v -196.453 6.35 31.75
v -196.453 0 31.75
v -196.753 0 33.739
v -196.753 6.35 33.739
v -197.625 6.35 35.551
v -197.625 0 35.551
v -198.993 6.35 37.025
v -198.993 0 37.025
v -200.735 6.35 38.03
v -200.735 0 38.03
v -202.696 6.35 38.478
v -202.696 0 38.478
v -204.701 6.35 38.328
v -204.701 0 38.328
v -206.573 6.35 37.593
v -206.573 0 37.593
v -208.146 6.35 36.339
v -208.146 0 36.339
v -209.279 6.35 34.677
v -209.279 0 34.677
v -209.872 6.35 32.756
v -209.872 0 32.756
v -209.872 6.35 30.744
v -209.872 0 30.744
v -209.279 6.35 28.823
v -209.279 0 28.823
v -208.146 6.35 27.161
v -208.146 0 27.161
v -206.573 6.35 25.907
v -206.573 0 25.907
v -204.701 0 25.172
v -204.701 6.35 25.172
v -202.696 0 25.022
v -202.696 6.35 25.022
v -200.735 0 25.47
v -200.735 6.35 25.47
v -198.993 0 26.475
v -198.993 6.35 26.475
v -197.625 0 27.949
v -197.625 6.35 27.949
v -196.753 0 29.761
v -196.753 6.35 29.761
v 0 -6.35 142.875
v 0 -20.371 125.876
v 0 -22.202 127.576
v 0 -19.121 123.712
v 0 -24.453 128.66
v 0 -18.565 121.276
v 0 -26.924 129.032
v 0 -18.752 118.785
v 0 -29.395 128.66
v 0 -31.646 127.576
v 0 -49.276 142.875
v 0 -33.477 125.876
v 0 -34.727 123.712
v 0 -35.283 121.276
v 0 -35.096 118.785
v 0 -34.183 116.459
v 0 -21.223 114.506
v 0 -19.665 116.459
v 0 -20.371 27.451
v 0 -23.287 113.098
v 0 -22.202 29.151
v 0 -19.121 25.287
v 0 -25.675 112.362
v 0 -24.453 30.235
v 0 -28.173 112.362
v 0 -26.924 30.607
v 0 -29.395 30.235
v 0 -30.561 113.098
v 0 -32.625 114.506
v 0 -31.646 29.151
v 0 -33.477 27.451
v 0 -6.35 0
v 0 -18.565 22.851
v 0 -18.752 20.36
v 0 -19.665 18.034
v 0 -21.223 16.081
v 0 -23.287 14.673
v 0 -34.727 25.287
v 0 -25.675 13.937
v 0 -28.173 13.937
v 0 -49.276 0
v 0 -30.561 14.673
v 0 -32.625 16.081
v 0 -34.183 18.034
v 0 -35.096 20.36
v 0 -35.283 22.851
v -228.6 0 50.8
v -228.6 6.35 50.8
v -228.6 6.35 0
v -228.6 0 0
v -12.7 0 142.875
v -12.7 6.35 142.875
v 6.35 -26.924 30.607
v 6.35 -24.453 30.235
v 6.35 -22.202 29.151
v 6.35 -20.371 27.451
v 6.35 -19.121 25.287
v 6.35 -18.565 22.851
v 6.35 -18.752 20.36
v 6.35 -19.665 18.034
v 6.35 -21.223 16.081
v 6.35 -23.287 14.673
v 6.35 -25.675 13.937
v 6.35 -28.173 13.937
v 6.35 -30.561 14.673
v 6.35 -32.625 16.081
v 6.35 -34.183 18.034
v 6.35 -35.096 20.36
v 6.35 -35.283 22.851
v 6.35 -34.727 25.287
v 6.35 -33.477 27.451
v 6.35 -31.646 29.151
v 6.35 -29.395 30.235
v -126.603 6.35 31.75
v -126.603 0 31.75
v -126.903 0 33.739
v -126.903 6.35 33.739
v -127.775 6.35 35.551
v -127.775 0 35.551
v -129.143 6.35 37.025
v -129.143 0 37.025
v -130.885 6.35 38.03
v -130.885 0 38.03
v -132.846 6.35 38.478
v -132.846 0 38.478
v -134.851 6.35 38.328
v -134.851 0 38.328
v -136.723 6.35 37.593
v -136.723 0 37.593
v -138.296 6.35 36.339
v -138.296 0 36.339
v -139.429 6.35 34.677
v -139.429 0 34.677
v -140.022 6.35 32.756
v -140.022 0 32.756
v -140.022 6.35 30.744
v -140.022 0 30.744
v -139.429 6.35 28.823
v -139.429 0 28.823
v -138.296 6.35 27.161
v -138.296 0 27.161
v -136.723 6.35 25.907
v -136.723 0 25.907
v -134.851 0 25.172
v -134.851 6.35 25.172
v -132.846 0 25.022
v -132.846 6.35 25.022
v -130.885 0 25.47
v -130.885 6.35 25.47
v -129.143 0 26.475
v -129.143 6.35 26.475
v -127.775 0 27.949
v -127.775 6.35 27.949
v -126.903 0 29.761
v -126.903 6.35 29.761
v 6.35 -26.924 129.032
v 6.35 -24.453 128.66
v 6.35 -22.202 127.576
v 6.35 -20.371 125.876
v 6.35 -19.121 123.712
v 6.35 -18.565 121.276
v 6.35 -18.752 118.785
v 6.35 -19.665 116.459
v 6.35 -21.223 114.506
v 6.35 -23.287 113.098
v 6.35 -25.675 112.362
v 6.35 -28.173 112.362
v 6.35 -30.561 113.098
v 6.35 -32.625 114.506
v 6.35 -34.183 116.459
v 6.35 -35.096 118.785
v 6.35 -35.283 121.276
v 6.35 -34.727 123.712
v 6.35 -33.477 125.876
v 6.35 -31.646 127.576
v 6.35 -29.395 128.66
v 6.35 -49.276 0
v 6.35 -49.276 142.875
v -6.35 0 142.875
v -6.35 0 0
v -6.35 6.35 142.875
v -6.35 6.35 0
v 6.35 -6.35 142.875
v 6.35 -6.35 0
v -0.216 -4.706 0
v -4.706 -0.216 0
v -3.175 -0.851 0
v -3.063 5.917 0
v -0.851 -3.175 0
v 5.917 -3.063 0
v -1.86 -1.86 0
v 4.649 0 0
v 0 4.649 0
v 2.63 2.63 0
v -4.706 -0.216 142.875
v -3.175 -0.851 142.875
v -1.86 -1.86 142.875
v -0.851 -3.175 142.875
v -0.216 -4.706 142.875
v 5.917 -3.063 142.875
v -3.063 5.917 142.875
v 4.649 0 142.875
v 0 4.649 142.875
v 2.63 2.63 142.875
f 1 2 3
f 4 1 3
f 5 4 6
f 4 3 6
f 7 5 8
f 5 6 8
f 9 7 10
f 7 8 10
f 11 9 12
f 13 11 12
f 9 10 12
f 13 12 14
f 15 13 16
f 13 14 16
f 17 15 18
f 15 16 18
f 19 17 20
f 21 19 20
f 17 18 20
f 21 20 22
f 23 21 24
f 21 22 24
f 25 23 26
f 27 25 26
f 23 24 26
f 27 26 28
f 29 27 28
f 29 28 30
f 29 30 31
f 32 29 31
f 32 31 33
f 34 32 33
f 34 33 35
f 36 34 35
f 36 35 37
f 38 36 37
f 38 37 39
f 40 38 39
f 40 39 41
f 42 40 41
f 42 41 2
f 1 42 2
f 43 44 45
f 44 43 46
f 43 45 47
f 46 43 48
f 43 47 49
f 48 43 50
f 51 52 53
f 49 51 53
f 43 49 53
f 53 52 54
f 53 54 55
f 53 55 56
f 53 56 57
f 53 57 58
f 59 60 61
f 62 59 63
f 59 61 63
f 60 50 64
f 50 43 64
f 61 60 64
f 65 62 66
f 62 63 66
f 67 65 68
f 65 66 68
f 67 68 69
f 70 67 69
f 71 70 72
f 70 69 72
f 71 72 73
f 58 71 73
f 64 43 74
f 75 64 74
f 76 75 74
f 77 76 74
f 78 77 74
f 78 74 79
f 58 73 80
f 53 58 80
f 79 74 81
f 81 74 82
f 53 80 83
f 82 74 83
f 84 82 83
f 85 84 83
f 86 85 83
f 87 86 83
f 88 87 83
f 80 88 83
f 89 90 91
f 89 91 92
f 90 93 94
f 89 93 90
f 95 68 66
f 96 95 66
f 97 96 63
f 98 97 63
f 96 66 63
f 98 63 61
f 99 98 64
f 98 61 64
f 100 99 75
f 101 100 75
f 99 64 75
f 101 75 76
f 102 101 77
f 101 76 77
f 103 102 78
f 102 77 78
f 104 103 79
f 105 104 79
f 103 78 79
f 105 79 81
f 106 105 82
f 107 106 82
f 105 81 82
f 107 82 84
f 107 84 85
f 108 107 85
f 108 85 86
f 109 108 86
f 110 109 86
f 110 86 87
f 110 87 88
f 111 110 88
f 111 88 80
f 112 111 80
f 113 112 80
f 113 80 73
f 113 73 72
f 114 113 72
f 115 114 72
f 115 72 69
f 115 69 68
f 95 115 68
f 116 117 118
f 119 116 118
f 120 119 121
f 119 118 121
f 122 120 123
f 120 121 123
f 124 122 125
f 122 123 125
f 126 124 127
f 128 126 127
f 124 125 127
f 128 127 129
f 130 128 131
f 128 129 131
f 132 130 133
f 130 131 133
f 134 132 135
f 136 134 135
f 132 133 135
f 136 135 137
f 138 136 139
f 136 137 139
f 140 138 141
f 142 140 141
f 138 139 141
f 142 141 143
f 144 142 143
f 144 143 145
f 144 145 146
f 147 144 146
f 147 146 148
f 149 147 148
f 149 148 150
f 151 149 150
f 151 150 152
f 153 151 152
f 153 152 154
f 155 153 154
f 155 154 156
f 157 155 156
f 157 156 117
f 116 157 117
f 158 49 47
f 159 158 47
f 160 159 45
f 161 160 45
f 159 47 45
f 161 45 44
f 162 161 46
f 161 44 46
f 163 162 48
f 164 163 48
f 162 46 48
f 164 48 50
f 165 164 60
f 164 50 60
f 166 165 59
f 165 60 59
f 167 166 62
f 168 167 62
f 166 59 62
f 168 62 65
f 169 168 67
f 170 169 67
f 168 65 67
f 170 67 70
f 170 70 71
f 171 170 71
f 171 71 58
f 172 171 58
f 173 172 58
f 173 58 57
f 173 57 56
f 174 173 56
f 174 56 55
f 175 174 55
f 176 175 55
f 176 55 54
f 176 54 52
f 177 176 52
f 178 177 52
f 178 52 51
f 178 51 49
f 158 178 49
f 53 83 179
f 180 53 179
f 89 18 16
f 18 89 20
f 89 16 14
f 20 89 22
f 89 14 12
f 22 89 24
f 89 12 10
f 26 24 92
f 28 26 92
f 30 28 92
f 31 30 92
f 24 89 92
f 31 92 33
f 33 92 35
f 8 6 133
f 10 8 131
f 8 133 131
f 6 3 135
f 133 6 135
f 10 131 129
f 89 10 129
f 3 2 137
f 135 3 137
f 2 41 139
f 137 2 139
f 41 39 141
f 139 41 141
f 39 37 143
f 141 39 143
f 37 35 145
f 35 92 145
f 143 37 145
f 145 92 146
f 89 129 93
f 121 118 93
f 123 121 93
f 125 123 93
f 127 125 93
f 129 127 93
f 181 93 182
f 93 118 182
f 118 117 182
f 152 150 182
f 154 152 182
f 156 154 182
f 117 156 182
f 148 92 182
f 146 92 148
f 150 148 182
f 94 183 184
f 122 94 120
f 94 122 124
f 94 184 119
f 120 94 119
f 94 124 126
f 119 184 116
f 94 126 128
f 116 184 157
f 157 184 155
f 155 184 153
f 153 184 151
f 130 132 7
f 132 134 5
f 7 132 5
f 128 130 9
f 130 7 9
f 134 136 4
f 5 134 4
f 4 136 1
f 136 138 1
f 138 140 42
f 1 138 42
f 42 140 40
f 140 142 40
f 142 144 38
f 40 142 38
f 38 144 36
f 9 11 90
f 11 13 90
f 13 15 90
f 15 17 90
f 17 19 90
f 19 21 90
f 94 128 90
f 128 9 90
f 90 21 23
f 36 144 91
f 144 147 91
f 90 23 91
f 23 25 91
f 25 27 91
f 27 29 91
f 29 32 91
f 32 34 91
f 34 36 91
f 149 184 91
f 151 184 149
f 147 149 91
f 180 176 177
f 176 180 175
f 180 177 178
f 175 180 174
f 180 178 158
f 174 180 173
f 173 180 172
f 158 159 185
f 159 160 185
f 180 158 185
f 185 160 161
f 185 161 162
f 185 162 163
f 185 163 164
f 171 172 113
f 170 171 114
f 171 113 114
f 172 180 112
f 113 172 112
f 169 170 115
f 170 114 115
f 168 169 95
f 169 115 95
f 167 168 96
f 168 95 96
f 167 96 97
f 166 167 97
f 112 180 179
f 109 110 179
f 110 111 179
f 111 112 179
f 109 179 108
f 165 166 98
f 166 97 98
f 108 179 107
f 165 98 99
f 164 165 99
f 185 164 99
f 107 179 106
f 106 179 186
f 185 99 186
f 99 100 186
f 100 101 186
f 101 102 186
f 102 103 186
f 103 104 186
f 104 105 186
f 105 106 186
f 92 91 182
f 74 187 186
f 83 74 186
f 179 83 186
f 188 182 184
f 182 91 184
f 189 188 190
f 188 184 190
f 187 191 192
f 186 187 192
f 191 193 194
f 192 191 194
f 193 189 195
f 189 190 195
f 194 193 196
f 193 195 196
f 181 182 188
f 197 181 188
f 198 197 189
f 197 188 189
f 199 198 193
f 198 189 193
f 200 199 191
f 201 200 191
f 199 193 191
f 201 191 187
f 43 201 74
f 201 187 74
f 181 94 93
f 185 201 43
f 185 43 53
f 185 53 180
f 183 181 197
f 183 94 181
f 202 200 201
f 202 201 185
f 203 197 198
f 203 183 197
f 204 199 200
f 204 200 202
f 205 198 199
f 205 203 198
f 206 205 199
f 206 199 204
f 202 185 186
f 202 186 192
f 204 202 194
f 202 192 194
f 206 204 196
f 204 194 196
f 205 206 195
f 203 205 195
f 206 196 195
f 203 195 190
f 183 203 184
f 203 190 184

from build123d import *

# Parameters (mm, degrees)
BASE_EXTRUDE_THIN_DEPTH = 142.875
CUT_CNR_DEPTH           = 7.35
CUT_CNR_DEPTH_BACK      = 50.276
HOLE_FLG_D              = 16.764
HOLE_TOP_D              = 13.49375
HOLE_TOP_DEPTH          = 25.4


with BuildPart() as part:
    # Sketch1 → Base-Extrude-Thin (new body)
    with BuildSketch(Plane.XY):
        with BuildLine():
            Line((-228.6, 0), (-6.35, 0))
            ThreePointArc((-6.35, 0), (-1.859871939, -1.859871939), (0, -6.35))
            Line((0, -6.35), (0, -49.276))
            Line((0, -49.276), (6.35, -49.276))
            Line((6.35, -49.276), (6.35, -6.35))
            ThreePointArc((6.35, -6.35), (2.630256121, 2.630256121), (-6.35, 6.35))
            Line((-6.35, 6.35), (-228.6, 6.35))
            Line((-228.6, 6.35), (-228.6, 0))
        make_face()
    extrude(amount=BASE_EXTRUDE_THIN_DEPTH)

    # Sketch2 → Cut cnr (cut, two sides)
    with BuildSketch(Plane(origin=(0, 0, 0), x_dir=(1, 0, 0), z_dir=(0, 1, 0))) as cut_cnr_sk:
        Polygon((-714.082135383, 156.243851855), (-228.6, -50.8), (-12.7, -142.875), (472.782135383, -349.918851855), (58.694431674, -1320.883122621), (-1128.169839092, -814.720418912), align=None)
    extrude(amount=CUT_CNR_DEPTH, mode=Mode.SUBTRACT)
    extrude(cut_cnr_sk.sketch, amount=-CUT_CNR_DEPTH_BACK, mode=Mode.SUBTRACT)

    # Hole-flg (through all)
    with Locations(Plane(origin=(6.35, 0, 0), x_dir=(0, 0, -1), z_dir=(1, 0, 0))):
        with Locations((-120.65, -26.924), (-22.225, -26.924)):
            Hole(HOLE_FLG_D / 2)

    # Hole-top
    with Locations(Plane(origin=(0, 6.35, 0), x_dir=(-1, 0, 0), z_dir=(0, 1, 0))):
        with Locations((203.2, 31.75), (133.35, 31.75)):
            Hole(HOLE_TOP_D / 2, depth=HOLE_TOP_DEPTH)


solid = part.part
